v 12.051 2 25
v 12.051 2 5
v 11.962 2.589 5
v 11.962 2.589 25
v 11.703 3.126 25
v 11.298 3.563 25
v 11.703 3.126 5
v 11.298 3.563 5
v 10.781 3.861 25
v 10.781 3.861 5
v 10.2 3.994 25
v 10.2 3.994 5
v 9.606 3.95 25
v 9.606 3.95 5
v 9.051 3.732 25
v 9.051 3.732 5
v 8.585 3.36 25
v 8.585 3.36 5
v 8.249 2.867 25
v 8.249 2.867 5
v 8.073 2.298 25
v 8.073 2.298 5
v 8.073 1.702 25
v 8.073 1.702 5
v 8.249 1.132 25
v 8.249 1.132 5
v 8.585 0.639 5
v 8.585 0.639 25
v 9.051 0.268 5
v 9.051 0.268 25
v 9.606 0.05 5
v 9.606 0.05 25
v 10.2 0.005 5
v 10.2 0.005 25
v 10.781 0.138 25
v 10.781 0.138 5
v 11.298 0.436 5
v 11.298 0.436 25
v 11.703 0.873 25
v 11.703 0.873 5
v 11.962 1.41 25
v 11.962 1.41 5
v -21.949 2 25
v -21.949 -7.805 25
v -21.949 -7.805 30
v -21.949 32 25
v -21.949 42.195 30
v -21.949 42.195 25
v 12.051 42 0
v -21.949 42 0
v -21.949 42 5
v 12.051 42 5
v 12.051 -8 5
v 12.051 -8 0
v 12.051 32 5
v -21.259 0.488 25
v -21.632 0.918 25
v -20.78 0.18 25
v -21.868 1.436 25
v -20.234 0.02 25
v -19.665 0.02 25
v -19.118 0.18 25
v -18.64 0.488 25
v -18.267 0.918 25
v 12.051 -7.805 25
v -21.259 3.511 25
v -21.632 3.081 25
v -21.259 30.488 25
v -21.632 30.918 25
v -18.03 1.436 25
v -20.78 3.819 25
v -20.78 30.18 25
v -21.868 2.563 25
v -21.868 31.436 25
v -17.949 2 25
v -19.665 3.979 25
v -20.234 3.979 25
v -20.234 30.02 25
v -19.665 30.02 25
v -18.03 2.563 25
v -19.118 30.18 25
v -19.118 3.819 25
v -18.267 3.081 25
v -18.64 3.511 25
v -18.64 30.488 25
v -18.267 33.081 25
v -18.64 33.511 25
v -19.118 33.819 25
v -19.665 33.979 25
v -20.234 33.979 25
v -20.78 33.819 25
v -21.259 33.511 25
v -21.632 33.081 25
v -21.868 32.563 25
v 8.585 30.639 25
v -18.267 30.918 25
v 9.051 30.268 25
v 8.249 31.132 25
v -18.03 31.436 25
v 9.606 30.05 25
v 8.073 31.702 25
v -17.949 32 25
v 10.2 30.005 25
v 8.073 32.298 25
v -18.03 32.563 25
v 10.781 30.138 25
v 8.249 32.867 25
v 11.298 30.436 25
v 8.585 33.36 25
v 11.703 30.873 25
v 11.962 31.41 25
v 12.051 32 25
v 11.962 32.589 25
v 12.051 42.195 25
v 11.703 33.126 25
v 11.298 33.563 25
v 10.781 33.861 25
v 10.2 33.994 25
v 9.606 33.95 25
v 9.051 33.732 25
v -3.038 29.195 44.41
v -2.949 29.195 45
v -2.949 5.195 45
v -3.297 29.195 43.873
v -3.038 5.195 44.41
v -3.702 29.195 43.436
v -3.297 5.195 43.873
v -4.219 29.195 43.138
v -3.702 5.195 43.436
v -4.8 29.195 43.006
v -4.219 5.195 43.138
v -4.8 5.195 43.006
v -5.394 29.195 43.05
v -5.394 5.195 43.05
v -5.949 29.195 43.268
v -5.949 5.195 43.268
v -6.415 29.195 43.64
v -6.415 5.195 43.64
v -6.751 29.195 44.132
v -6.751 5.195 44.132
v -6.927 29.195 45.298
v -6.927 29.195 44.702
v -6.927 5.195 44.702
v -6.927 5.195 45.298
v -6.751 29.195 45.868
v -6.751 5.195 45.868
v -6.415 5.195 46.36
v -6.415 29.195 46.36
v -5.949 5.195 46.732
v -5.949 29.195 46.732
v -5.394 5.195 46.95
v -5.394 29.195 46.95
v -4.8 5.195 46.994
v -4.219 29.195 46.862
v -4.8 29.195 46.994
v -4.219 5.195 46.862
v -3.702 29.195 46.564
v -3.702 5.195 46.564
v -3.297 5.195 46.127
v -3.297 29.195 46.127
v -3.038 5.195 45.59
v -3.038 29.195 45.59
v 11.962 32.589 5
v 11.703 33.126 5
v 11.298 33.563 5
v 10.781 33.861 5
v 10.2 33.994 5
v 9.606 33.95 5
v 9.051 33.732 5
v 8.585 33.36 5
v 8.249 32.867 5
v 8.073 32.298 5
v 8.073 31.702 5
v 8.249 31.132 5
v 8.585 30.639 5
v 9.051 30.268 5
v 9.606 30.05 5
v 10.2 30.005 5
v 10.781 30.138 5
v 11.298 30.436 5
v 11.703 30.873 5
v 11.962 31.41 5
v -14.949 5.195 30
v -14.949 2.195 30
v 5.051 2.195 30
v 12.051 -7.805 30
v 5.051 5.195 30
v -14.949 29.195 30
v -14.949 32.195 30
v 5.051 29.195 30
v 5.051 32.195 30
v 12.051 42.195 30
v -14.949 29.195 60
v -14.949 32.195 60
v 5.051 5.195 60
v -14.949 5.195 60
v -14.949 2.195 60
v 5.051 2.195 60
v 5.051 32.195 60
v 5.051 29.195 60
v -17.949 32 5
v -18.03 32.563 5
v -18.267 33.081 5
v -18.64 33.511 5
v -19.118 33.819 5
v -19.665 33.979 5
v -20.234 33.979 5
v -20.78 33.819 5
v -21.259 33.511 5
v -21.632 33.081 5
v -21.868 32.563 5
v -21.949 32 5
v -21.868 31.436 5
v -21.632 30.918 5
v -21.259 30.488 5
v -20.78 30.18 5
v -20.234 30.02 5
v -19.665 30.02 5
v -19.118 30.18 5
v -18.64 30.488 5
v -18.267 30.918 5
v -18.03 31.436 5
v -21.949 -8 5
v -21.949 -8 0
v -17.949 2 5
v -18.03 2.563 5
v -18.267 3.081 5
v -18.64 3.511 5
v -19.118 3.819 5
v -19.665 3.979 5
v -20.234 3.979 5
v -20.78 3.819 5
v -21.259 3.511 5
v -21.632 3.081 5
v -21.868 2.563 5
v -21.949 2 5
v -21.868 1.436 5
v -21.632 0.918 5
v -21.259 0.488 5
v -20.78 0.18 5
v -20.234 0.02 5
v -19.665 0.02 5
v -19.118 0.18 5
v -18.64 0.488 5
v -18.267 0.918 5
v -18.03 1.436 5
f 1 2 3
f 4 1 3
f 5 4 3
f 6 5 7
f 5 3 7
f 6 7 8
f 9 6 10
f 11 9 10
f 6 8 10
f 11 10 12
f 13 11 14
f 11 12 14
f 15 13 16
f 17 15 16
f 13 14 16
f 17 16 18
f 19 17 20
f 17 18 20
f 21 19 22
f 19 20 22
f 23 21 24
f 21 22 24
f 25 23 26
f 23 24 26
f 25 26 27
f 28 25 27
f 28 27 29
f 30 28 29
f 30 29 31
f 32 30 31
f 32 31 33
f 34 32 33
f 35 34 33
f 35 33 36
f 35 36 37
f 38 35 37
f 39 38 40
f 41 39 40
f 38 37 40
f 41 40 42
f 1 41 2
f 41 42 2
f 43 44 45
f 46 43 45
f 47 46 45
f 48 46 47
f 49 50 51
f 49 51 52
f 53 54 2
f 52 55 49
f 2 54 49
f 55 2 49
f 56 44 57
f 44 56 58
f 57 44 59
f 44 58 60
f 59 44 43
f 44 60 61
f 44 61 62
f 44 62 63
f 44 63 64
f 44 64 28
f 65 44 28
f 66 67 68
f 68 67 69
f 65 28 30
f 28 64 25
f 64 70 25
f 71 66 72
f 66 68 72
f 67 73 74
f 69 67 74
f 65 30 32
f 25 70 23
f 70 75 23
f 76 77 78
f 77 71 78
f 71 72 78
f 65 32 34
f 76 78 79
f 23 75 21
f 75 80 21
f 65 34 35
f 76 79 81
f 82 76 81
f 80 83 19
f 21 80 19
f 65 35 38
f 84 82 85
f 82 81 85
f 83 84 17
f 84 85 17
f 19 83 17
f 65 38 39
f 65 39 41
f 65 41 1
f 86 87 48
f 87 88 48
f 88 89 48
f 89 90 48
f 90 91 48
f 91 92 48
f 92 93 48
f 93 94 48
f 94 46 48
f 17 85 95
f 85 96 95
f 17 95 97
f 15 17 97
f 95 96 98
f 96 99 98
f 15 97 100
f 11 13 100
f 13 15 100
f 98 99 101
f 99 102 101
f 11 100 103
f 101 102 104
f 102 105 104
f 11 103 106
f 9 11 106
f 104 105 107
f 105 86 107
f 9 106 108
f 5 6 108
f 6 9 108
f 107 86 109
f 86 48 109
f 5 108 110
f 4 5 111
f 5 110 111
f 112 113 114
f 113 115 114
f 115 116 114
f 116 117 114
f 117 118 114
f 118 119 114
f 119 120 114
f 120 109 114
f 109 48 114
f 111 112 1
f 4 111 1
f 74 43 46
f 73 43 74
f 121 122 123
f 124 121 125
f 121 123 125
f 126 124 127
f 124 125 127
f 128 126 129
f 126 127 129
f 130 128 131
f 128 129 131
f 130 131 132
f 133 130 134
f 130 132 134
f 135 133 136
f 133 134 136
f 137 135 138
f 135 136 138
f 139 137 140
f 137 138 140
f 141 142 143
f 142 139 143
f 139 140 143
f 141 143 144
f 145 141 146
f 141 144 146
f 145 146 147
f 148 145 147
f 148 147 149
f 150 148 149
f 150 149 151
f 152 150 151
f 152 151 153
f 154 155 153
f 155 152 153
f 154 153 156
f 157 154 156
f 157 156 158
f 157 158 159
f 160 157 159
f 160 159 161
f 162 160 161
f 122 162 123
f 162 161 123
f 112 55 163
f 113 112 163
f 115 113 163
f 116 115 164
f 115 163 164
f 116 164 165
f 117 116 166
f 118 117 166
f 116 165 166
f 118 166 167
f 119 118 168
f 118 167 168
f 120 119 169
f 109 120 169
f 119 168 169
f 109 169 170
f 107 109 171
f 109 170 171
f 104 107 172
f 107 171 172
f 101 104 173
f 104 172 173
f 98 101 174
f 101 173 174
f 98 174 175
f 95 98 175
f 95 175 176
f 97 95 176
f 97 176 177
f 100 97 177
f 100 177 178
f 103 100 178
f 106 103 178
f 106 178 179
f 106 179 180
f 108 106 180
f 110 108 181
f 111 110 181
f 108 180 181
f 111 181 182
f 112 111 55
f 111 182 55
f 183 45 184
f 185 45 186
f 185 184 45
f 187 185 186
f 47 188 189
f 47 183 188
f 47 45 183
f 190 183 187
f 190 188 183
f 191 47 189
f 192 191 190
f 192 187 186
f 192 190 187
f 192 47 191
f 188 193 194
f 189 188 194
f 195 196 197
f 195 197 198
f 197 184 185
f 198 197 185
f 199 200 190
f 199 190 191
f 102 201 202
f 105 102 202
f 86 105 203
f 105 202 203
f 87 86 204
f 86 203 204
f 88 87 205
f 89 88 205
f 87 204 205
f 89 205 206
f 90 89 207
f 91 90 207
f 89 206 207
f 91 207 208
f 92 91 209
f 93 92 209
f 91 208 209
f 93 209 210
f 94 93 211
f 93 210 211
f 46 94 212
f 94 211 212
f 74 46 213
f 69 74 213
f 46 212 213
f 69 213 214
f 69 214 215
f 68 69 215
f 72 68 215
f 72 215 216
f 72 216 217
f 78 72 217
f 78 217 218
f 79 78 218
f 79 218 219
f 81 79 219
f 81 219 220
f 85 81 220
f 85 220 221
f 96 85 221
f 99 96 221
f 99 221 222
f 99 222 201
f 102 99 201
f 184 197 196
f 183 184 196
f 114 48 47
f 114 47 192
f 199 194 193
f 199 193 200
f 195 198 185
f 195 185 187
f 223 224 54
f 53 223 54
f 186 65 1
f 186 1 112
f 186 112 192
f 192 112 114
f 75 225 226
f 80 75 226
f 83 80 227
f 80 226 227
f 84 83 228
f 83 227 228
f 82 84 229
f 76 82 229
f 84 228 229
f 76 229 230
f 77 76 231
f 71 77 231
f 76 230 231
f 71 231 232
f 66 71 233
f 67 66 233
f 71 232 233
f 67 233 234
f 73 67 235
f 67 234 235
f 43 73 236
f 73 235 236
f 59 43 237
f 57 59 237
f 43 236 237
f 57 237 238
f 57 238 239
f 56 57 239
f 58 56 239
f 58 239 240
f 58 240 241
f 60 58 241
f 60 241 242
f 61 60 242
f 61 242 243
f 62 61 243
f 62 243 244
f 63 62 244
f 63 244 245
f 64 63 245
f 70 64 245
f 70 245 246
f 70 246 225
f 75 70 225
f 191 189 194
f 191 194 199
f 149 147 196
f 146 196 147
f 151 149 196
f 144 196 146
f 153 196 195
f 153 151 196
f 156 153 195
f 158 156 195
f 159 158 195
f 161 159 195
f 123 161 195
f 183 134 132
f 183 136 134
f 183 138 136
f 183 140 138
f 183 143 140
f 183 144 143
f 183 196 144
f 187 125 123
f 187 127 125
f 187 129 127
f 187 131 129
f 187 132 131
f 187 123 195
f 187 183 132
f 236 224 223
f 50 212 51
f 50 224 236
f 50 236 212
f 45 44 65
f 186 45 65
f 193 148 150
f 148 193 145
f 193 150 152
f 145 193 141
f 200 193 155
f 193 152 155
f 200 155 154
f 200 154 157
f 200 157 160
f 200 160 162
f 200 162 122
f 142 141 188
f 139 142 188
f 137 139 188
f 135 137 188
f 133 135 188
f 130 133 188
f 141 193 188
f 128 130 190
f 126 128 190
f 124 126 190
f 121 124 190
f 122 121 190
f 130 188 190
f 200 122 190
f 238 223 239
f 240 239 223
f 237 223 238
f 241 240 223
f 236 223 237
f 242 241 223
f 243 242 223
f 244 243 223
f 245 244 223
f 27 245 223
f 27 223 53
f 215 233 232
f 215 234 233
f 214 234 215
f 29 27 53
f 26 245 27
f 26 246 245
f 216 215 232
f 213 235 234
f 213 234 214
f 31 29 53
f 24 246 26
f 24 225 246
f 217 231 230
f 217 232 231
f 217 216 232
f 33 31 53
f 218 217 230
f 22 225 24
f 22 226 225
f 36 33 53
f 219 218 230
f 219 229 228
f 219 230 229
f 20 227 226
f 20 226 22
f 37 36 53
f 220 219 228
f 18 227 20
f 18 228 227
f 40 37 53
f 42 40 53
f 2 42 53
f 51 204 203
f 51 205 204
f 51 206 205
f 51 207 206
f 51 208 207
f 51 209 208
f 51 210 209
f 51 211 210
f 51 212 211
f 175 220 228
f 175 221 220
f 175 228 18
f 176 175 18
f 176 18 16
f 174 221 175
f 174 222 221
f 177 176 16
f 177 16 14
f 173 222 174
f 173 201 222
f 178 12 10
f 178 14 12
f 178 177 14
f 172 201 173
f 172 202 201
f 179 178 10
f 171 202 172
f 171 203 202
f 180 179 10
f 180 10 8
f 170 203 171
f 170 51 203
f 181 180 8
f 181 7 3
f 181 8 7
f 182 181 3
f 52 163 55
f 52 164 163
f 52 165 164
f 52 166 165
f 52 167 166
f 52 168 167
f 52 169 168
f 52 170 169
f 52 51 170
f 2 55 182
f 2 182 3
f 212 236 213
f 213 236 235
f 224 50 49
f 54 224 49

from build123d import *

# Parameters (mm, degrees)
SKETCH_1_W      = 34
SKETCH_1_H      = 50
EXTRUDE_1_DEPTH = 5
SKETCH_2_R      = 2
EXTRUDE_2_DEPTH = 20
SKETCH_3_W      = 34
SKETCH_3_H      = 50
EXTRUDE_3_DEPTH = 5
SKETCH_4_W      = 20
SKETCH_4_H      = 3
EXTRUDE_4_DEPTH = 30
SKETCH_5_R      = 2
EXTRUDE_5_DEPTH = 25


with BuildPart() as part:
    # 草图1 → 凸台-拉伸1 (new body)
    with BuildSketch(Plane.XY):
        with Locations((-4.949270059, 16.999651533)):
            Rectangle(SKETCH_1_W, SKETCH_1_H)
    extrude(amount=EXTRUDE_1_DEPTH)

    # 草图2 → 凸台-拉伸2 (add)
    with BuildSketch(Plane.XY.offset(5)):
        with Locations((-19.949270059, 31.999651533)):
            Circle(SKETCH_2_R)
        with Locations((-19.949270059, 1.999651533)):
            Circle(SKETCH_2_R)
        with Locations((10.050729941, 31.999651533)):
            Circle(SKETCH_2_R)
        with Locations((10.050729941, 1.999651533)):
            Circle(SKETCH_2_R)
    extrude(amount=EXTRUDE_2_DEPTH)

    # 草图3 → 凸台-拉伸3 (add)
    with BuildSketch(Plane.XY.offset(25)):
        with Locations((-4.949270059, 17.194555641)):
            Rectangle(SKETCH_3_W, SKETCH_3_H)
    extrude(amount=EXTRUDE_3_DEPTH)

    # 草图4 → 凸台-拉伸4 (add)
    with BuildSketch(Plane.XY.offset(30)):
        with Locations((-4.949270059, 30.694555641)):
            Rectangle(SKETCH_4_W, SKETCH_4_H)
        with Locations((-4.949270059, 3.694555641)):
            Rectangle(SKETCH_4_W, SKETCH_4_H)
    extrude(amount=EXTRUDE_4_DEPTH)

    # 草图5 → 凸台-拉伸5 (add)
    with BuildSketch(Plane(origin=(0, 5.194555641, 0), x_dir=(1, 0, 0), z_dir=(0, 1, 0))):
        with Locations((-4.949270059, -45)):
            Circle(SKETCH_5_R)
    extrude(amount=EXTRUDE_5_DEPTH)


solid = part.part
